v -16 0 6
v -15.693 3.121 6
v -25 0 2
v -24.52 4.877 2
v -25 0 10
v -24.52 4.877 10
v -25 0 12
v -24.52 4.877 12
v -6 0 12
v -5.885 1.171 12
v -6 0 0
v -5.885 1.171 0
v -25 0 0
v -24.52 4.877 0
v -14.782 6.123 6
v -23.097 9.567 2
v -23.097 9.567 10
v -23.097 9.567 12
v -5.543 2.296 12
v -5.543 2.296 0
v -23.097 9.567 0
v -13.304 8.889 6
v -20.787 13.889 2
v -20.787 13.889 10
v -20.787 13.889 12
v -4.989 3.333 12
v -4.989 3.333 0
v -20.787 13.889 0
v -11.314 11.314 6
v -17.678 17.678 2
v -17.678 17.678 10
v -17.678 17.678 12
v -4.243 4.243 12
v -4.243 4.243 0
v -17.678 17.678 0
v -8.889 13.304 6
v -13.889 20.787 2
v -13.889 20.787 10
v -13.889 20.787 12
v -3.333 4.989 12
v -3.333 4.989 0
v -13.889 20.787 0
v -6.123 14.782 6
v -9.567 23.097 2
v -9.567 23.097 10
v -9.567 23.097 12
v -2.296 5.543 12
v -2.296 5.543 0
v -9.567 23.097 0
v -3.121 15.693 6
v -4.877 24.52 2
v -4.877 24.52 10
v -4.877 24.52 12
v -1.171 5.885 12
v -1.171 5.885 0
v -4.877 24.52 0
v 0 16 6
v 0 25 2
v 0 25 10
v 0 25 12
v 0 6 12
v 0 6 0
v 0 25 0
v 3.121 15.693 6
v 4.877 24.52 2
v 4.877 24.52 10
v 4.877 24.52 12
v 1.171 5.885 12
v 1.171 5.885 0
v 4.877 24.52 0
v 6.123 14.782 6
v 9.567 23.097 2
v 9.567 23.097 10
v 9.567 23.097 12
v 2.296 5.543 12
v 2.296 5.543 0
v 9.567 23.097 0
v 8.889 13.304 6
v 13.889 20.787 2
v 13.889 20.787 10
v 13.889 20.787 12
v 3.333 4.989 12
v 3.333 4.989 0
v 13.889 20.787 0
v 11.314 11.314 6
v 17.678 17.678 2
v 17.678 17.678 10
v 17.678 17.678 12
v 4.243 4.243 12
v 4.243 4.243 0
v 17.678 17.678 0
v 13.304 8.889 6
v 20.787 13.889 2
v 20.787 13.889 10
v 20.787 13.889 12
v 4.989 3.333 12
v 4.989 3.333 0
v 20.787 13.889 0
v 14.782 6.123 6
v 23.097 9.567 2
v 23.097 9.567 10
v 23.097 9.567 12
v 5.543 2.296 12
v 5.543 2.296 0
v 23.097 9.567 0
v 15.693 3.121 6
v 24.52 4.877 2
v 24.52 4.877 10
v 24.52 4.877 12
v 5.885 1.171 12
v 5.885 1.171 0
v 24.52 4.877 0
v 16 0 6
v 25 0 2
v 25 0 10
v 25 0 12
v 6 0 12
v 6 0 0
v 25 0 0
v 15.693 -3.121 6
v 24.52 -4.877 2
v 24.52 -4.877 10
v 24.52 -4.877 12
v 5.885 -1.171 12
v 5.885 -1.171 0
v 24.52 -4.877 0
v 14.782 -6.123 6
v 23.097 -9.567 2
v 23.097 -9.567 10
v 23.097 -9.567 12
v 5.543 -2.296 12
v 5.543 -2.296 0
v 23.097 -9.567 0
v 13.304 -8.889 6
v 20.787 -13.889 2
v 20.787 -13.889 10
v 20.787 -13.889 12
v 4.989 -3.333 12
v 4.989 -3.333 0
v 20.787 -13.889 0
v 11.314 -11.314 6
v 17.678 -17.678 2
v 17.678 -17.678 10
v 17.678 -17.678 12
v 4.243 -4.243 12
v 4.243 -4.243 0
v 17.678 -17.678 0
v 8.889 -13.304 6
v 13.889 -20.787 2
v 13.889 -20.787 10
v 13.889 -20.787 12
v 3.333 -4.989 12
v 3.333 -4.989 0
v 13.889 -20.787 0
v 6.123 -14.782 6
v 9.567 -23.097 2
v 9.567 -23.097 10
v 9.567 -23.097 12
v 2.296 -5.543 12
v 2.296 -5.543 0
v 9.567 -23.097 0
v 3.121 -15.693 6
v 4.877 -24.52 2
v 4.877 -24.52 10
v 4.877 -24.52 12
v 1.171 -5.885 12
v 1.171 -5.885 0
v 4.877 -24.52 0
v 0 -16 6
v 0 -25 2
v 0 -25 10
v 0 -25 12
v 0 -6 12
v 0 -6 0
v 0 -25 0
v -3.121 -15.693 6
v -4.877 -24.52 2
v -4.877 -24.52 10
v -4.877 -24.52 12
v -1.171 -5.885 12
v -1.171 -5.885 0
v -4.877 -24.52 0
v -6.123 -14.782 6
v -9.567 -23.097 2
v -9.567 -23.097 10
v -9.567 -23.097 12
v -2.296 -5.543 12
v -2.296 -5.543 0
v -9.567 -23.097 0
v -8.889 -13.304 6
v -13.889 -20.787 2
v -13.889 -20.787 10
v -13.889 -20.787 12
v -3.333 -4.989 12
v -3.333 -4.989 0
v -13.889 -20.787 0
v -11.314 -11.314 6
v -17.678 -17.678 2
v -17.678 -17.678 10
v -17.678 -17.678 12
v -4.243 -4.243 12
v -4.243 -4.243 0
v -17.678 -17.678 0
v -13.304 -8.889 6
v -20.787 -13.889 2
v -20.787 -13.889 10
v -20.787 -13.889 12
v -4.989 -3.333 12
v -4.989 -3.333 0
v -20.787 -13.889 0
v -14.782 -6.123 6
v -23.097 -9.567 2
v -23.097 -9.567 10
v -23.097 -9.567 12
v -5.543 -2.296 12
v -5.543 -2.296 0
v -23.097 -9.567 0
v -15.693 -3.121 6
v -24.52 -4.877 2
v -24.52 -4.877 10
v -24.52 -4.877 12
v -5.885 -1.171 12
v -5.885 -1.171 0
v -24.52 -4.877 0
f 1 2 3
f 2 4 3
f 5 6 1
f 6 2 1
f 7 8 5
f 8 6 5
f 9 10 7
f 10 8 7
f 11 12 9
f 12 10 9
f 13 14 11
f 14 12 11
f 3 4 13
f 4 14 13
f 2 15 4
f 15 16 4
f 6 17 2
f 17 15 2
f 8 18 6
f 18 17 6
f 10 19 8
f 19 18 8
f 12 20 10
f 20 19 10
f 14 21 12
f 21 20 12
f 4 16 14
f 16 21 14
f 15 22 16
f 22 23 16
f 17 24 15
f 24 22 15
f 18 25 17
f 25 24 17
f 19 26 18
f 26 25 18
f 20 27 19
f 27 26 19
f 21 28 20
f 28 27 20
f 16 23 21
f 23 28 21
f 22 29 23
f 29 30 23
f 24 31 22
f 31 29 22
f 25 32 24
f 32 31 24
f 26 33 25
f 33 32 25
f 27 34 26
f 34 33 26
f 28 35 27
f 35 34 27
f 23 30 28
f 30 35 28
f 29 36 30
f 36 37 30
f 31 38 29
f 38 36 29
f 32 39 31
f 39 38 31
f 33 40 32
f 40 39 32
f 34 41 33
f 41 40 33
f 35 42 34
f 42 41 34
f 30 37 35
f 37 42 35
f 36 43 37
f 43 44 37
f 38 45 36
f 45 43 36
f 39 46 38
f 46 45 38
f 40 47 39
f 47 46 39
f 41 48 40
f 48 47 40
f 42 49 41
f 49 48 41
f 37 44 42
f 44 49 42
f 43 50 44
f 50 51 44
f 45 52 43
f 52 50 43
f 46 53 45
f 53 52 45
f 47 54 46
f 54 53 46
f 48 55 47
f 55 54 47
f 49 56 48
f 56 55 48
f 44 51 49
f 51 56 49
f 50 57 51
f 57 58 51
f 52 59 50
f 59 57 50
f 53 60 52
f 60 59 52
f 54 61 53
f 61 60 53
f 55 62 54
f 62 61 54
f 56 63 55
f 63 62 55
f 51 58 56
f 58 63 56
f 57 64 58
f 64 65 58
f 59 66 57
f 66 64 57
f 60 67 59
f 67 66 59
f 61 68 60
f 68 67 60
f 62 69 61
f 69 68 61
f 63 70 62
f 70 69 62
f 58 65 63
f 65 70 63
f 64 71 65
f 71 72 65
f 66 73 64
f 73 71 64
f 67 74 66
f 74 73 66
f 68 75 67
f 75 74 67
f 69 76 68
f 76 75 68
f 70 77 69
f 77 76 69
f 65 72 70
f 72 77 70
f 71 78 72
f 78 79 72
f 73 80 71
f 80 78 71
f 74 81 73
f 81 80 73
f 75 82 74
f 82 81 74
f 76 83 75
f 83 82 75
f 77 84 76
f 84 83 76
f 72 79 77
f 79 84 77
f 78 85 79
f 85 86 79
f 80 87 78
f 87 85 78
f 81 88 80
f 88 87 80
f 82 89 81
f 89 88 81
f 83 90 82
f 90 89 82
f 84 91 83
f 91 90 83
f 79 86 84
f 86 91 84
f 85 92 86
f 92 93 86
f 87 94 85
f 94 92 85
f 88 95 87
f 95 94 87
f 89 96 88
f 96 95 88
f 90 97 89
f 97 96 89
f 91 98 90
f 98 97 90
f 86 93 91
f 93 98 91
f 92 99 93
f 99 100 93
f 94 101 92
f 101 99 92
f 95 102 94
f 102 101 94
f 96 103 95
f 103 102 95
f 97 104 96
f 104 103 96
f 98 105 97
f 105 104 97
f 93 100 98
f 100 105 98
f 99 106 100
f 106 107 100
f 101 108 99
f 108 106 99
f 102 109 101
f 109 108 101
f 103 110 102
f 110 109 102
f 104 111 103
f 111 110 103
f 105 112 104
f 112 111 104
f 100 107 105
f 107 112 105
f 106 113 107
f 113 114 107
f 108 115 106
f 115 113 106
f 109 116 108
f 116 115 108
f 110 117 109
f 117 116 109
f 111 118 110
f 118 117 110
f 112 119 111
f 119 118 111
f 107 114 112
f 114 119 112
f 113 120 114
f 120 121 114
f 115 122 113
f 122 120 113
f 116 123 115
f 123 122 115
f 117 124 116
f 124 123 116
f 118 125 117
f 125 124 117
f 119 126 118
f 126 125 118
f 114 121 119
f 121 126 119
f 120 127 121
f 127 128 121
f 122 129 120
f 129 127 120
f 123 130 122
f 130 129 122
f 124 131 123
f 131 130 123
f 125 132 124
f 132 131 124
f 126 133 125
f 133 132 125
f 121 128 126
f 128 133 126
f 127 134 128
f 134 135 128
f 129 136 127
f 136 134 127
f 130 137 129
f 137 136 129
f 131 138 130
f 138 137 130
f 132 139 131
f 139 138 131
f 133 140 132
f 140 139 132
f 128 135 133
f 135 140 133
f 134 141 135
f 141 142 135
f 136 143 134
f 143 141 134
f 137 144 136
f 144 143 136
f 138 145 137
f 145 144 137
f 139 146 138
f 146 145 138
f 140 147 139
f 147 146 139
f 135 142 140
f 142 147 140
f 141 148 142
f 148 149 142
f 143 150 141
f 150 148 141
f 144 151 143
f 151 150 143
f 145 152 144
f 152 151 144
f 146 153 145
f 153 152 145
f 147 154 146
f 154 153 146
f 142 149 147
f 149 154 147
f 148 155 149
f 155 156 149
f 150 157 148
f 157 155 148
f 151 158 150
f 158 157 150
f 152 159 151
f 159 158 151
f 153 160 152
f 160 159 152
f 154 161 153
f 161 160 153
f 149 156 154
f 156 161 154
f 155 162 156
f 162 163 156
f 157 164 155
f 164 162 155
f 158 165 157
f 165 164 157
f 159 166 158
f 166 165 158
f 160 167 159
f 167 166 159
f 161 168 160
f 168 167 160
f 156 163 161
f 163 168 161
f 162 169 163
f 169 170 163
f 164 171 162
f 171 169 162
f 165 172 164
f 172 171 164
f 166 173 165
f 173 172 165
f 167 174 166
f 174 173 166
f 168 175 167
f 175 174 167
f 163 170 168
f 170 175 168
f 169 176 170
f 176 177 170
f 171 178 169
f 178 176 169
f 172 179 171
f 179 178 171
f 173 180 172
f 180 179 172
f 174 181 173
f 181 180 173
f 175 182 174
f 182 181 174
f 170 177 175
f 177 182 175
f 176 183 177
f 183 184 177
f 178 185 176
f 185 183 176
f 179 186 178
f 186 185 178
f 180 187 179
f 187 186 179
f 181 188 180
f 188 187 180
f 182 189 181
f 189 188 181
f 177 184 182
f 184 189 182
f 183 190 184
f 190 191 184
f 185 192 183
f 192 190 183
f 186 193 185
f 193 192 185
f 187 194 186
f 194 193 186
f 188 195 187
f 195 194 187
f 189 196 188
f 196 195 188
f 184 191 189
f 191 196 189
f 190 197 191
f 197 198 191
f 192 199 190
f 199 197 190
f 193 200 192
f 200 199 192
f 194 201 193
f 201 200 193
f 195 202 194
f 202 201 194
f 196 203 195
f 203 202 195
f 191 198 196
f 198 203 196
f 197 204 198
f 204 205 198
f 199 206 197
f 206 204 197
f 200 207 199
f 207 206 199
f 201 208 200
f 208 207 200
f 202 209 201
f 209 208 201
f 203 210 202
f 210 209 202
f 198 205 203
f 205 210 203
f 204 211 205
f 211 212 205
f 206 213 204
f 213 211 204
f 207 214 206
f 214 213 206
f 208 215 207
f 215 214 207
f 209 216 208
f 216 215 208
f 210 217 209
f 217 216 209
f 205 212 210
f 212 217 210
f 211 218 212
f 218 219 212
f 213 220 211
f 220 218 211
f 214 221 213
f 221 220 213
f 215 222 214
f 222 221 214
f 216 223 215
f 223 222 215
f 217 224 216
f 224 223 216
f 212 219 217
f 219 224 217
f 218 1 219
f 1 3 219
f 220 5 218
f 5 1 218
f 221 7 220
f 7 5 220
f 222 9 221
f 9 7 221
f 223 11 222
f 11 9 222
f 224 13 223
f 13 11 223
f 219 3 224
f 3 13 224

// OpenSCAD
$fn = 32;

// ----------------------------------------------------------------------
// Revolved part: V-groove pulley R25
// ----------------------------------------------------------------------

// --- parameters (mm) ---
bore_r = 6;               // bore radius
rim_r = 25;               // rim radius
rim_t = 12;               // rim width
groove_r = 16;            // groove root radius
groove_w = 4;             // groove half width
revolve_angle = 360;      // revolve sweep, degrees
fit_tol = 0.02;           // declared fit tolerance (prompt contract)
free_tol = 0.2;           // declared free tolerance (prompt contract)

bore_d = 2 * bore_r;
rim_d = 2 * rim_r;
groove_d = 2 * groove_r;

profile = [[6, 0], [25, 0], [25, 2], [16, 6], [25, 10], [25, 12], [6, 12]];  // primary outline, 7 points, counter clockwise

// --- the one profile operation ---
rotate_extrude(angle = revolve_angle) polygon(points = profile);
